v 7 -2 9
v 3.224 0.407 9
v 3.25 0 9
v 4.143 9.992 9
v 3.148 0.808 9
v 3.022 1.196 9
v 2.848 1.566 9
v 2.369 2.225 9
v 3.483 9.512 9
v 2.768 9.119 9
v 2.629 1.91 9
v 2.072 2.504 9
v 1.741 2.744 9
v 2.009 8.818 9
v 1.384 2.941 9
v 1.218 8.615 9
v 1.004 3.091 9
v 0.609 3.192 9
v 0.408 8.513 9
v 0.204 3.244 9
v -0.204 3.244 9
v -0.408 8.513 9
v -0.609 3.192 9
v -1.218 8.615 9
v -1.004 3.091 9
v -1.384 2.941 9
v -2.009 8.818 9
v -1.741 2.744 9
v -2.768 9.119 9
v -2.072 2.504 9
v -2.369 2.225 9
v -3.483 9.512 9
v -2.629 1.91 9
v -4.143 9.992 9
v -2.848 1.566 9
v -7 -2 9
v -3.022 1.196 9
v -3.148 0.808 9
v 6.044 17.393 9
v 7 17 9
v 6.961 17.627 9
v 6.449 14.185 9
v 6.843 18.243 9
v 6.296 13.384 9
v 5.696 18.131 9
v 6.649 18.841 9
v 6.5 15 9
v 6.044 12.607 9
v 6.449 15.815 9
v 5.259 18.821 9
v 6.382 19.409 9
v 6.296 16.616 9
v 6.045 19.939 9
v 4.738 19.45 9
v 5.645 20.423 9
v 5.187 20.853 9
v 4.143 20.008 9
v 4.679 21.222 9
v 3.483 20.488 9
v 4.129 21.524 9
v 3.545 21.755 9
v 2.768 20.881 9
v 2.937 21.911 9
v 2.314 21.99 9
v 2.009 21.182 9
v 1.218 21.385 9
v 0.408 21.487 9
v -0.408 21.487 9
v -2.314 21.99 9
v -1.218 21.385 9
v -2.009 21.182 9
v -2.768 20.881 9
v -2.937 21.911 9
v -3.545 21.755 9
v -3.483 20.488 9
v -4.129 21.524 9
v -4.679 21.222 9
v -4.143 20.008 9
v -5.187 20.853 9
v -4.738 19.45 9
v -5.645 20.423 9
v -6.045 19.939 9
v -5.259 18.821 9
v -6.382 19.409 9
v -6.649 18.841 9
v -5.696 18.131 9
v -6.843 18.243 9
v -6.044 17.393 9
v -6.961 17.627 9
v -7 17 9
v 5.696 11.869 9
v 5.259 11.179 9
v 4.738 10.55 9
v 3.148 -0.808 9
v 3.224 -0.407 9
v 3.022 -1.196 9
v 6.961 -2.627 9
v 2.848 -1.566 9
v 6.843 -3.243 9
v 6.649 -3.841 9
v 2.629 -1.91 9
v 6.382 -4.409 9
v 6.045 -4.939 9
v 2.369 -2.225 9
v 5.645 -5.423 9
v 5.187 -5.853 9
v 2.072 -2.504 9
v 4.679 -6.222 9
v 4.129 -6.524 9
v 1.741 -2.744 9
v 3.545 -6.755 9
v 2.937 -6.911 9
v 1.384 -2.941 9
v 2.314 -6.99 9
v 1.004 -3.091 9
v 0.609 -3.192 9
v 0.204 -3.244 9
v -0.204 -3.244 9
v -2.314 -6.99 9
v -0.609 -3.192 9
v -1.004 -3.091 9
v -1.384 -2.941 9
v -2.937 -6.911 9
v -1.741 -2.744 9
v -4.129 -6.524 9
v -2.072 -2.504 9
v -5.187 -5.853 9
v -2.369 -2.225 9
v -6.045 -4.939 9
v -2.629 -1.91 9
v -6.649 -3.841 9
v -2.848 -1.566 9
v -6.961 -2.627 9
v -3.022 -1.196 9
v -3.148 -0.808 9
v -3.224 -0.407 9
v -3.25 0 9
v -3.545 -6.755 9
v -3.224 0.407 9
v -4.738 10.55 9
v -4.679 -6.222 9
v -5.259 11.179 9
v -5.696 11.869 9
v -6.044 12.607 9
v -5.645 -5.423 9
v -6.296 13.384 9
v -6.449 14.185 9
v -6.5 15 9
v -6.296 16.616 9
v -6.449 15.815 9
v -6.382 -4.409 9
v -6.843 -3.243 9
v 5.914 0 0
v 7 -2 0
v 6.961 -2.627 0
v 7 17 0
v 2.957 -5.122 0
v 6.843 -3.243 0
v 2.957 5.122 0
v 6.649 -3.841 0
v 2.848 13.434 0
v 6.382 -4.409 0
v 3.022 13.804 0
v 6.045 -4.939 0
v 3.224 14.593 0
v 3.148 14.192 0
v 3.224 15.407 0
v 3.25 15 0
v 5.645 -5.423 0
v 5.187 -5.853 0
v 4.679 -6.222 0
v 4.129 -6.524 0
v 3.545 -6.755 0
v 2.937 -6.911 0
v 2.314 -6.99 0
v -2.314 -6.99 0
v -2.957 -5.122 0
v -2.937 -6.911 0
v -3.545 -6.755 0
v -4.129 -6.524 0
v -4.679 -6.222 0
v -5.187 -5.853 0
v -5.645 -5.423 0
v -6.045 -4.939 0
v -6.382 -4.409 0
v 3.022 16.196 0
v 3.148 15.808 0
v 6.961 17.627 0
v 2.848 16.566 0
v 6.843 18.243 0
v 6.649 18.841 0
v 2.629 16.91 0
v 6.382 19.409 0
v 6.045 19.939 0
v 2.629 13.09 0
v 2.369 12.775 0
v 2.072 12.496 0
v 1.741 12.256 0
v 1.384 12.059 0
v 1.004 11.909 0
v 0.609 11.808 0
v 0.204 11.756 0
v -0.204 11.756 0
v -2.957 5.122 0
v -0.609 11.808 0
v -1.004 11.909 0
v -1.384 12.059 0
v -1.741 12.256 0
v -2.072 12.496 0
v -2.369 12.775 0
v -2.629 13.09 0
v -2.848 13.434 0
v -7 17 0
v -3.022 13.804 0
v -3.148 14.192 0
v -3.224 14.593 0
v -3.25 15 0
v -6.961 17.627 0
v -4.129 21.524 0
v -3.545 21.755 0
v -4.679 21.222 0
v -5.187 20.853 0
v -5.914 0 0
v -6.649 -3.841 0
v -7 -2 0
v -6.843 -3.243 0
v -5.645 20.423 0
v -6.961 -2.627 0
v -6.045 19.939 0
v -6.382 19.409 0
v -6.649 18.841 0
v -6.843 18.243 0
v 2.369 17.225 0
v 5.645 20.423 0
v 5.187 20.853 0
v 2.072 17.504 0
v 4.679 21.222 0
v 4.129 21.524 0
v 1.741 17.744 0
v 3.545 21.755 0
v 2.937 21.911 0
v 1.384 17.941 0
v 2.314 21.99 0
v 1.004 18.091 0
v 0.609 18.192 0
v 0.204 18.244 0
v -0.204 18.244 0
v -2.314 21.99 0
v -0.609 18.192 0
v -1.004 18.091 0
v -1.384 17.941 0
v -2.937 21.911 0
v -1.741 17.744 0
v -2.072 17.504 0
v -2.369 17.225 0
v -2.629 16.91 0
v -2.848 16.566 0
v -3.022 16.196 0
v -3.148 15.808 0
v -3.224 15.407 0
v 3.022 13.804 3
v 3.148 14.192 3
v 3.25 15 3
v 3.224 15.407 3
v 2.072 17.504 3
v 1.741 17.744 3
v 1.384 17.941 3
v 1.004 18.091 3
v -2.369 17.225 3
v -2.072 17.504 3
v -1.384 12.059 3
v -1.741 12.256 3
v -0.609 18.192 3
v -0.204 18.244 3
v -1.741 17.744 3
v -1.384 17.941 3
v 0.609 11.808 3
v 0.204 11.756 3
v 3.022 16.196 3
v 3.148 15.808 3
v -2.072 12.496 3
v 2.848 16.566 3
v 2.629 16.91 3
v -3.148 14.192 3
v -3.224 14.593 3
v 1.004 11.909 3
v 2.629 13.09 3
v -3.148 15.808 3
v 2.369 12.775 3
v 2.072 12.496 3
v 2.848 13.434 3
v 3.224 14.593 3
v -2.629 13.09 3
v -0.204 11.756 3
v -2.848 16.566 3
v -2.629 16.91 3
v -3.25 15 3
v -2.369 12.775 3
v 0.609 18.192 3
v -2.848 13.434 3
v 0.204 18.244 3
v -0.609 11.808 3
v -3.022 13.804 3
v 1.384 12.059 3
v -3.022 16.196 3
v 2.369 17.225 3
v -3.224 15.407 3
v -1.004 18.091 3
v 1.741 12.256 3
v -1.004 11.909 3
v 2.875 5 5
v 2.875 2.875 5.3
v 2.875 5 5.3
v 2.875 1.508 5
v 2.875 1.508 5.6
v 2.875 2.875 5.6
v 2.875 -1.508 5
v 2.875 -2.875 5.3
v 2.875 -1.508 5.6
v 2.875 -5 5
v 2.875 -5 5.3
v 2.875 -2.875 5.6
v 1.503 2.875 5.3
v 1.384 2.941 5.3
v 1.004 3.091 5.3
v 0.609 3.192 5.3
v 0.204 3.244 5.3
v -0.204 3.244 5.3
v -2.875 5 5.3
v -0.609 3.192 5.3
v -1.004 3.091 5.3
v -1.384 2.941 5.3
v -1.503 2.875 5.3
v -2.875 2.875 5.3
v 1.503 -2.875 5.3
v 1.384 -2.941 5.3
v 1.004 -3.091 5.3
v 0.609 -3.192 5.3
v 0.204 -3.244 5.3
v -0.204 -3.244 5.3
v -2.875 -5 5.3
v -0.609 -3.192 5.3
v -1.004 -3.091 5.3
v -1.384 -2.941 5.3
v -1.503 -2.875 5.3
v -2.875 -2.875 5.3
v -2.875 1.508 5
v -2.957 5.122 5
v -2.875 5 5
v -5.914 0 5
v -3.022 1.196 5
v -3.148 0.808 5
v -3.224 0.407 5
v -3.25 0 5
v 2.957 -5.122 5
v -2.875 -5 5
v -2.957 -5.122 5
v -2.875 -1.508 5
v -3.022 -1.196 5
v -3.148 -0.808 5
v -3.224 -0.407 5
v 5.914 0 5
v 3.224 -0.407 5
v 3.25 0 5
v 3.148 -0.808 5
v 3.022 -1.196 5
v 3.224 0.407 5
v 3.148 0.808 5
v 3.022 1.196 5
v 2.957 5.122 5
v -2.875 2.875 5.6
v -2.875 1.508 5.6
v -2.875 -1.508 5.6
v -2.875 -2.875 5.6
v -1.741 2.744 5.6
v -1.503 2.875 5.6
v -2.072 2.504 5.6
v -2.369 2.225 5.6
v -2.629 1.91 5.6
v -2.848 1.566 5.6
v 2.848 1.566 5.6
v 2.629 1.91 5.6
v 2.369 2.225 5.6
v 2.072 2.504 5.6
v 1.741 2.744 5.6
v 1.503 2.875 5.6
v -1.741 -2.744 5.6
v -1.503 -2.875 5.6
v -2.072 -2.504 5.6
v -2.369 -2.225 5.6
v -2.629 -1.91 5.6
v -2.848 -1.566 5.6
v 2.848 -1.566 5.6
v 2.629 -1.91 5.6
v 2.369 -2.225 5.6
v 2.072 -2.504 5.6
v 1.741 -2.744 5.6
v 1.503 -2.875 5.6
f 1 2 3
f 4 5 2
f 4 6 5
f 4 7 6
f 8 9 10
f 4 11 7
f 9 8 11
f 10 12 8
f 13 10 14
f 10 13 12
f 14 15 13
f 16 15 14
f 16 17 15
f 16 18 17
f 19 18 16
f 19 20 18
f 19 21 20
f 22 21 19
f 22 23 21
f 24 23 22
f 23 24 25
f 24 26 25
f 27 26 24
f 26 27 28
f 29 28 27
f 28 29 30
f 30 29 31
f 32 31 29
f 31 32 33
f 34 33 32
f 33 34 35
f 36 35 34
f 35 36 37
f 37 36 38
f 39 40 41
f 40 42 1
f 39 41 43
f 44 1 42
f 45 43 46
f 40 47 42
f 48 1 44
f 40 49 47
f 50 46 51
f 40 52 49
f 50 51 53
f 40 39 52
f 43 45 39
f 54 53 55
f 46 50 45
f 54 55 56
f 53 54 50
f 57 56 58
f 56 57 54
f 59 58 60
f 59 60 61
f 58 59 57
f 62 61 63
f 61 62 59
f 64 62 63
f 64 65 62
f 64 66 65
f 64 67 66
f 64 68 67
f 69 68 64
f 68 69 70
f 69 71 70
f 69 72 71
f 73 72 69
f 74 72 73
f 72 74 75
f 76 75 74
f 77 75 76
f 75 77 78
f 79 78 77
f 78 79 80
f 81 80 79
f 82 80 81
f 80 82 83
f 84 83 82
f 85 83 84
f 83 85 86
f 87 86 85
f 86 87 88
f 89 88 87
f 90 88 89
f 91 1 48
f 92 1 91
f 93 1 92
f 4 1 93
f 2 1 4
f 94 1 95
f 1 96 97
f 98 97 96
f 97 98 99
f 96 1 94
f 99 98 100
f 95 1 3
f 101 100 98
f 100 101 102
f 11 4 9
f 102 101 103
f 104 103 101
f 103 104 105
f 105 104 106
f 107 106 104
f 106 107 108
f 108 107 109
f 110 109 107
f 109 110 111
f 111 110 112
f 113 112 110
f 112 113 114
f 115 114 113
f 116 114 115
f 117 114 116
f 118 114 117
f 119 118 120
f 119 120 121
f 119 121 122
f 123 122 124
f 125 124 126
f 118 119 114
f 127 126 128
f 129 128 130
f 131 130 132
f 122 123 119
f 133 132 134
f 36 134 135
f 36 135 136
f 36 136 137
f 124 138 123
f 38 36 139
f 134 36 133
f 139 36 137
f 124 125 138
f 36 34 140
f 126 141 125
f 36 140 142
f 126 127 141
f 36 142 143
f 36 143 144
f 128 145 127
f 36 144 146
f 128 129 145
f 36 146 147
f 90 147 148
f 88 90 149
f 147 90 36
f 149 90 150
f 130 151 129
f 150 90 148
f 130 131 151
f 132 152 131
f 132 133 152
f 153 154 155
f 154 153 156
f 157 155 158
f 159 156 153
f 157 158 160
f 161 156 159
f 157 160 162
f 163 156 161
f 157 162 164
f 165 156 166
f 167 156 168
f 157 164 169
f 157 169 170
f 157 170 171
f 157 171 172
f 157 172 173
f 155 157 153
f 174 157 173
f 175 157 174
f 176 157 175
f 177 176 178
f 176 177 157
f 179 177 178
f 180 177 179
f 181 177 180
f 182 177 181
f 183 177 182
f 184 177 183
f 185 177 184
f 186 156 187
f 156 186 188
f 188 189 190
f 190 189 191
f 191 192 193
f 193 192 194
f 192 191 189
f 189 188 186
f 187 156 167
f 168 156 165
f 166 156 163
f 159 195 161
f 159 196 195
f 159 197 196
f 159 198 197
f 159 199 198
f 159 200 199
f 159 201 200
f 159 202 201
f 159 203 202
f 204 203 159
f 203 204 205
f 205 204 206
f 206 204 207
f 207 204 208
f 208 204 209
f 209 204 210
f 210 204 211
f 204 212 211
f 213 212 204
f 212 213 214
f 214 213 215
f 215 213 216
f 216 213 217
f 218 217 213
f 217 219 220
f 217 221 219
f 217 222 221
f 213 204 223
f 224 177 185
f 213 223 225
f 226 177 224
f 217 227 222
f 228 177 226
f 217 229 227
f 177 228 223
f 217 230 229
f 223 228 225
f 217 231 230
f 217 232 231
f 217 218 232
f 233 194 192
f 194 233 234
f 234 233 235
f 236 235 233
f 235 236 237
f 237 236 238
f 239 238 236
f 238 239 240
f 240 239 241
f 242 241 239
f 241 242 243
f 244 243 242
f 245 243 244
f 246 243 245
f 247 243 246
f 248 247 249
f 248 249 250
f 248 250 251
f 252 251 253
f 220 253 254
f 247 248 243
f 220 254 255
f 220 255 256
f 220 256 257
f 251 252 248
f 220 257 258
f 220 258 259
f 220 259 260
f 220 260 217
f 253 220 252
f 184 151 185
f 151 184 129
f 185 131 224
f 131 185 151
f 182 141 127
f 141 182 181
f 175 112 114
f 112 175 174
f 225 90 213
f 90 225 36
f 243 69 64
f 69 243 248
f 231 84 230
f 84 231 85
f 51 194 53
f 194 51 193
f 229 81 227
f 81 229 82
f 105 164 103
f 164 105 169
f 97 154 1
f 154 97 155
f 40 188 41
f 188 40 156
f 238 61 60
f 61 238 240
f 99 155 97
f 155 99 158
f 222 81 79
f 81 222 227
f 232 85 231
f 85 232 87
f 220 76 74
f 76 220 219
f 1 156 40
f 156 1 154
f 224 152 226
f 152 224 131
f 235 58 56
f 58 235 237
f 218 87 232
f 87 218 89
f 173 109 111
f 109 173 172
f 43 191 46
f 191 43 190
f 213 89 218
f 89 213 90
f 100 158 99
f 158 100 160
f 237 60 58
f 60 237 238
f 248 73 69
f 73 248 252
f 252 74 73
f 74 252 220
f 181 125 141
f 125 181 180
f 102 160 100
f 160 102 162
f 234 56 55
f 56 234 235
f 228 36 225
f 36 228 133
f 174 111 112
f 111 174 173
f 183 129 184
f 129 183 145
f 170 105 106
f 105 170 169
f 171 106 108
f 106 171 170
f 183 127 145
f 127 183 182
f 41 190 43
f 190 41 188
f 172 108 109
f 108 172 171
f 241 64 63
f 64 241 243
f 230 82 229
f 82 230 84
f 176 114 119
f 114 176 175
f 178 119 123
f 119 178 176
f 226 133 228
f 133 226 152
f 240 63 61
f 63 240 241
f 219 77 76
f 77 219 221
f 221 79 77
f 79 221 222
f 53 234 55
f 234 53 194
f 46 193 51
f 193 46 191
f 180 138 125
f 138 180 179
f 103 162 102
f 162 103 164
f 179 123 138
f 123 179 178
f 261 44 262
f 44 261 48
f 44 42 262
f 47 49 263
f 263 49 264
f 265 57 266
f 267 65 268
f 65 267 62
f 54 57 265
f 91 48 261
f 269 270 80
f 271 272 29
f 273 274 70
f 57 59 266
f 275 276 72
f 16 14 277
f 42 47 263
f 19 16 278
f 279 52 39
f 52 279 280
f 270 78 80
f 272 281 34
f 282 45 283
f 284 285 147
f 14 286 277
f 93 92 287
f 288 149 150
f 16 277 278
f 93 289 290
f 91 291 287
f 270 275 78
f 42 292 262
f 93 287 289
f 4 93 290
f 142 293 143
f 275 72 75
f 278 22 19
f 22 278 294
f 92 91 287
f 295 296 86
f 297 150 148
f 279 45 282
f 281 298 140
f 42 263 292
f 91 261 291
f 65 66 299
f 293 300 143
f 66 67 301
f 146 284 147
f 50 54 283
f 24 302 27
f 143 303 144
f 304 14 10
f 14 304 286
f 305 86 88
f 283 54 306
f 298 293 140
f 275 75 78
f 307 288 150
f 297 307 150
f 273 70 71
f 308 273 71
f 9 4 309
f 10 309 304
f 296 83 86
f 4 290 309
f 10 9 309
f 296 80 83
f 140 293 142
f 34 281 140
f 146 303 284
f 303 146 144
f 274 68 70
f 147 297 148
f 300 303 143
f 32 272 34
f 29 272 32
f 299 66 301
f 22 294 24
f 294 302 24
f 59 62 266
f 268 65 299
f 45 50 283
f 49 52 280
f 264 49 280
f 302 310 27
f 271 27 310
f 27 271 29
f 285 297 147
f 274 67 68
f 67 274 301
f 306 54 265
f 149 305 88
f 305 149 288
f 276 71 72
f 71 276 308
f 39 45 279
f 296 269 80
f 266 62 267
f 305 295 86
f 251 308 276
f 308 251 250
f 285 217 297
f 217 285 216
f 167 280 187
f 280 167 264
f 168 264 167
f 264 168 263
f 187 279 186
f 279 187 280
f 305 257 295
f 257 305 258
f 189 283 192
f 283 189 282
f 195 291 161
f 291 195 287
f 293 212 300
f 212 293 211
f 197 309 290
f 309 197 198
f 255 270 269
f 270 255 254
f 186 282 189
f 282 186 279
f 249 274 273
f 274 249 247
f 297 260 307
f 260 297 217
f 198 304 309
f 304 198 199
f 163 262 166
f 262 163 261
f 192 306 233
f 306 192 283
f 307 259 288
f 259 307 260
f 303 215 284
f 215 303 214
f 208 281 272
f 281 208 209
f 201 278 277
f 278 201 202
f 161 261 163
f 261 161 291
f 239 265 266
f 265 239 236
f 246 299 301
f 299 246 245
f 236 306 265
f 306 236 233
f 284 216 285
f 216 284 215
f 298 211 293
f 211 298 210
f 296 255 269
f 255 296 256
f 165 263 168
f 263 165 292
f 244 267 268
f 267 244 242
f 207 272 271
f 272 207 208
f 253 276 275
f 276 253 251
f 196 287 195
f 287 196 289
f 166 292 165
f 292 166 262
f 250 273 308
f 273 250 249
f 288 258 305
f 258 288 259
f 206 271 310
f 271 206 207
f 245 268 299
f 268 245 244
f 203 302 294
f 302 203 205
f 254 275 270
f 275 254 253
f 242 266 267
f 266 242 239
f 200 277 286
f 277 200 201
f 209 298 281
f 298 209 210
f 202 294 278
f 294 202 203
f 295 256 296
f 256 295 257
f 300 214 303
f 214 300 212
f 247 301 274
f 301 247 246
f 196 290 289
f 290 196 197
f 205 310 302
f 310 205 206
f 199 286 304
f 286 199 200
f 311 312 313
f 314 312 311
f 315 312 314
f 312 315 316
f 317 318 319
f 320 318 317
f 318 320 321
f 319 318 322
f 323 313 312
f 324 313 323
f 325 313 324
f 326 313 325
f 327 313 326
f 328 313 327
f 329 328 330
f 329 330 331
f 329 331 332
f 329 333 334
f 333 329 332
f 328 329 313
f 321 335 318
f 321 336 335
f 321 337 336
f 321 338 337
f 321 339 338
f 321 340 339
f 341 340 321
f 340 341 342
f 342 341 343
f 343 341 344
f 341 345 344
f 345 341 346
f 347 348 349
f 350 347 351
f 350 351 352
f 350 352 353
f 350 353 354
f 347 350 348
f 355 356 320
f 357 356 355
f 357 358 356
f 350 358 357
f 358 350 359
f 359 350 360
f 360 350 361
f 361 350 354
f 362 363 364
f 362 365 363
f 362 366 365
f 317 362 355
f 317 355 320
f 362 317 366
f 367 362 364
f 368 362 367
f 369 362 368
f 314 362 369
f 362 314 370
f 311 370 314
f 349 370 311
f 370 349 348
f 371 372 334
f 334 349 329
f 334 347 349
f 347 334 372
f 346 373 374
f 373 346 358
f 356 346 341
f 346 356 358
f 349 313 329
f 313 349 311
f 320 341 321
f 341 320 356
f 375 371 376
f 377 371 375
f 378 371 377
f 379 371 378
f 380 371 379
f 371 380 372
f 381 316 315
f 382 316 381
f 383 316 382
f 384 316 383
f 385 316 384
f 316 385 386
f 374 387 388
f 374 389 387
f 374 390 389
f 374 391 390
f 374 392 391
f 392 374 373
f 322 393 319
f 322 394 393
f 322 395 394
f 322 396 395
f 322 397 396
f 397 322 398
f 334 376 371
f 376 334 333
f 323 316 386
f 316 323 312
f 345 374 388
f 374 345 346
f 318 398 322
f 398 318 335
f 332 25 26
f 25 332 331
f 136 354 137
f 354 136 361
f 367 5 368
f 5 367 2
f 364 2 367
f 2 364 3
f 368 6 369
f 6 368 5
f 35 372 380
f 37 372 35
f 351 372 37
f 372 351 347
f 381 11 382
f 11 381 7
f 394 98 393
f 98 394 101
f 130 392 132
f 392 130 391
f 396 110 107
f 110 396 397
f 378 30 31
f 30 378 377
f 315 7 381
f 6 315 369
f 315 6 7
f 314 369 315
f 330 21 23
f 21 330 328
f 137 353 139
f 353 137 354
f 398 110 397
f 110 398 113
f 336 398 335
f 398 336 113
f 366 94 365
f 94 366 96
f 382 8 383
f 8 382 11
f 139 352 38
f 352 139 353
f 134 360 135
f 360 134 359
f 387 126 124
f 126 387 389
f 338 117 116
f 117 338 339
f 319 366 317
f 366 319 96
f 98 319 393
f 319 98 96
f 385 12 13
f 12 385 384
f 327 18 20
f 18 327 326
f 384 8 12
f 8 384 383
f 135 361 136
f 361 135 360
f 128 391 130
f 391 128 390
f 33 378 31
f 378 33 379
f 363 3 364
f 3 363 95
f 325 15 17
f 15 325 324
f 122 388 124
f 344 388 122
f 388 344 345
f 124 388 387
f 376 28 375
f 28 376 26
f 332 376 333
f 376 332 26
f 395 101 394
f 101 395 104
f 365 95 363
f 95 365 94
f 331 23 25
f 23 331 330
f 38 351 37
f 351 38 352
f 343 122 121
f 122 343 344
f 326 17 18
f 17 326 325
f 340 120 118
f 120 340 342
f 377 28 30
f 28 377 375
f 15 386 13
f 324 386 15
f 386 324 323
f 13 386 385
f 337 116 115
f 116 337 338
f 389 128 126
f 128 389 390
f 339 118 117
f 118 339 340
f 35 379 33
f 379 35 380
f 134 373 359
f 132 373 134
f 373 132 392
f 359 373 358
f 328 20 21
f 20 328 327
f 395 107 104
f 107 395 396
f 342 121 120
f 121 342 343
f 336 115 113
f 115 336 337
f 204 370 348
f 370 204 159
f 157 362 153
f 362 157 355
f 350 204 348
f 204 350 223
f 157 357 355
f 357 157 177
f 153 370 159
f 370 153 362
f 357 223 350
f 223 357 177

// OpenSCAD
$fn = 50;


difference() {
	union() {
		cylinder(h = 9, r = 7.0000000000);
		translate(v = [0.0000000000, 7.5000000000, 0]) {
			hull() {
				translate(v = [-2.0000000000, 9.5000000000, 0]) {
					cylinder(h = 9, r = 5);
				}
				translate(v = [2.0000000000, 9.5000000000, 0]) {
					cylinder(h = 9, r = 5);
				}
				translate(v = [-2.0000000000, -9.5000000000, 0]) {
					cylinder(h = 9, r = 5);
				}
				translate(v = [2.0000000000, -9.5000000000, 0]) {
					cylinder(h = 9, r = 5);
				}
			}
		}
		translate(v = [0.0000000000, 7.5000000000, 0]) {
			hull() {
				translate(v = [-2.0000000000, 9.5000000000, 0]) {
					cylinder(h = 9, r = 5);
				}
				translate(v = [2.0000000000, 9.5000000000, 0]) {
					cylinder(h = 9, r = 5);
				}
				translate(v = [-2.0000000000, -9.5000000000, 0]) {
					cylinder(h = 9, r = 5);
				}
				translate(v = [2.0000000000, -9.5000000000, 0]) {
					cylinder(h = 9, r = 5);
				}
			}
		}
	}
	union() {
		translate(v = [0.0000000000, 15.0000000000, 9]) {
			rotate(a = [0, 0, 0]) {
				difference() {
					union() {
						#translate(v = [0, 0, -9.0000000000]) {
							cylinder(h = 9, r = 2.2500000000);
						}
						#translate(v = [0, 0, -6]) {
							cylinder(h = 6, r1 = 3.2500000000, r2 = 6.5000000000);
						}
						#translate(v = [0, 0, -9.0000000000]) {
							cylinder(h = 9, r = 3.2500000000);
						}
						#translate(v = [0, 0, -9.0000000000]) {
							cylinder(h = 9, r = 2.2500000000);
						}
					}
					union();
				}
			}
		}
		translate(v = [0.0000000000, 15.0000000000, 9]) {
			rotate(a = [0, 0, 0]) {
				difference() {
					union() {
						#translate(v = [0, 0, -9.0000000000]) {
							cylinder(h = 9, r = 2.2500000000);
						}
						#translate(v = [0, 0, -6]) {
							cylinder(h = 6, r1 = 3.2500000000, r2 = 6.5000000000);
						}
						#translate(v = [0, 0, -9.0000000000]) {
							cylinder(h = 9, r = 3.2500000000);
						}
						#translate(v = [0, 0, -9.0000000000]) {
							cylinder(h = 9, r = 2.2500000000);
						}
					}
					union();
				}
			}
		}
		translate(v = [0.0000000000, 0.0000000000, 0]) {
			rotate(a = [0, 0, 0]) {
				difference() {
					union() {
						#translate(v = [-2.8750000000, -5.0000000000, -0.3000000000]) {
							cube(size = [5.7500000000, 10, 0.3000000000]);
						}
						#translate(v = [-2.8750000000, -2.8750000000, -0.6000000000]) {
							cube(size = [5.7500000000, 5.7500000000, 0.3000000000]);
						}
						#translate(v = [-2.8750000000, -5.0000000000, 5]) {
							cube(size = [5.7500000000, 10, 0.3000000000]);
						}
						#translate(v = [-2.8750000000, -2.8750000000, 5.3000000000]) {
							cube(size = [5.7500000000, 5.7500000000, 0.3000000000]);
						}
						#translate(v = [0, 0, -100.0000000000]) {
							cylinder(h = 200, r = 3.2500000000);
						}
						#linear_extrude(height = 5) {
							polygon(points = [[5.9142500000, 0.0000000000], [2.9571250000, 5.1218907443], [-2.9571250000, 5.1218907443], [-5.9142500000, 0.0000000000], [-2.9571250000, -5.1218907443], [2.9571250000, -5.1218907443]]);
						}
						#translate(v = [-2.8750000000, -5.0000000000, -0.3000000000]) {
							cube(size = [5.7500000000, 10, 0.3000000000]);
						}
						#translate(v = [-2.8750000000, -2.8750000000, -0.6000000000]) {
							cube(size = [5.7500000000, 5.7500000000, 0.3000000000]);
						}
						#translate(v = [-2.8750000000, -5.0000000000, 5]) {
							cube(size = [5.7500000000, 10, 0.3000000000]);
						}
						#translate(v = [-2.8750000000, -2.8750000000, 5.3000000000]) {
							cube(size = [5.7500000000, 5.7500000000, 0.3000000000]);
						}
						#translate(v = [0, 0, -100.0000000000]) {
							cylinder(h = 200, r = 3.2500000000);
						}
						#translate(v = [-2.8750000000, -5.0000000000, -0.3000000000]) {
							cube(size = [5.7500000000, 10, 0.3000000000]);
						}
						#translate(v = [-2.8750000000, -2.8750000000, -0.6000000000]) {
							cube(size = [5.7500000000, 5.7500000000, 0.3000000000]);
						}
						#translate(v = [-2.8750000000, -5.0000000000, 5]) {
							cube(size = [5.7500000000, 10, 0.3000000000]);
						}
						#translate(v = [-2.8750000000, -2.8750000000, 5.3000000000]) {
							cube(size = [5.7500000000, 5.7500000000, 0.3000000000]);
						}
						#translate(v = [0, 0, -100.0000000000]) {
							cylinder(h = 200, r = 3.2500000000);
						}
					}
					union();
				}
			}
		}
		translate(v = [0, 0, -100]) {
			cylinder(h = 200, r = 3.2500000000);
		}
		translate(v = [0, 0, -100]) {
			cylinder(h = 200, r = 1.8000000000);
		}
	}
}
